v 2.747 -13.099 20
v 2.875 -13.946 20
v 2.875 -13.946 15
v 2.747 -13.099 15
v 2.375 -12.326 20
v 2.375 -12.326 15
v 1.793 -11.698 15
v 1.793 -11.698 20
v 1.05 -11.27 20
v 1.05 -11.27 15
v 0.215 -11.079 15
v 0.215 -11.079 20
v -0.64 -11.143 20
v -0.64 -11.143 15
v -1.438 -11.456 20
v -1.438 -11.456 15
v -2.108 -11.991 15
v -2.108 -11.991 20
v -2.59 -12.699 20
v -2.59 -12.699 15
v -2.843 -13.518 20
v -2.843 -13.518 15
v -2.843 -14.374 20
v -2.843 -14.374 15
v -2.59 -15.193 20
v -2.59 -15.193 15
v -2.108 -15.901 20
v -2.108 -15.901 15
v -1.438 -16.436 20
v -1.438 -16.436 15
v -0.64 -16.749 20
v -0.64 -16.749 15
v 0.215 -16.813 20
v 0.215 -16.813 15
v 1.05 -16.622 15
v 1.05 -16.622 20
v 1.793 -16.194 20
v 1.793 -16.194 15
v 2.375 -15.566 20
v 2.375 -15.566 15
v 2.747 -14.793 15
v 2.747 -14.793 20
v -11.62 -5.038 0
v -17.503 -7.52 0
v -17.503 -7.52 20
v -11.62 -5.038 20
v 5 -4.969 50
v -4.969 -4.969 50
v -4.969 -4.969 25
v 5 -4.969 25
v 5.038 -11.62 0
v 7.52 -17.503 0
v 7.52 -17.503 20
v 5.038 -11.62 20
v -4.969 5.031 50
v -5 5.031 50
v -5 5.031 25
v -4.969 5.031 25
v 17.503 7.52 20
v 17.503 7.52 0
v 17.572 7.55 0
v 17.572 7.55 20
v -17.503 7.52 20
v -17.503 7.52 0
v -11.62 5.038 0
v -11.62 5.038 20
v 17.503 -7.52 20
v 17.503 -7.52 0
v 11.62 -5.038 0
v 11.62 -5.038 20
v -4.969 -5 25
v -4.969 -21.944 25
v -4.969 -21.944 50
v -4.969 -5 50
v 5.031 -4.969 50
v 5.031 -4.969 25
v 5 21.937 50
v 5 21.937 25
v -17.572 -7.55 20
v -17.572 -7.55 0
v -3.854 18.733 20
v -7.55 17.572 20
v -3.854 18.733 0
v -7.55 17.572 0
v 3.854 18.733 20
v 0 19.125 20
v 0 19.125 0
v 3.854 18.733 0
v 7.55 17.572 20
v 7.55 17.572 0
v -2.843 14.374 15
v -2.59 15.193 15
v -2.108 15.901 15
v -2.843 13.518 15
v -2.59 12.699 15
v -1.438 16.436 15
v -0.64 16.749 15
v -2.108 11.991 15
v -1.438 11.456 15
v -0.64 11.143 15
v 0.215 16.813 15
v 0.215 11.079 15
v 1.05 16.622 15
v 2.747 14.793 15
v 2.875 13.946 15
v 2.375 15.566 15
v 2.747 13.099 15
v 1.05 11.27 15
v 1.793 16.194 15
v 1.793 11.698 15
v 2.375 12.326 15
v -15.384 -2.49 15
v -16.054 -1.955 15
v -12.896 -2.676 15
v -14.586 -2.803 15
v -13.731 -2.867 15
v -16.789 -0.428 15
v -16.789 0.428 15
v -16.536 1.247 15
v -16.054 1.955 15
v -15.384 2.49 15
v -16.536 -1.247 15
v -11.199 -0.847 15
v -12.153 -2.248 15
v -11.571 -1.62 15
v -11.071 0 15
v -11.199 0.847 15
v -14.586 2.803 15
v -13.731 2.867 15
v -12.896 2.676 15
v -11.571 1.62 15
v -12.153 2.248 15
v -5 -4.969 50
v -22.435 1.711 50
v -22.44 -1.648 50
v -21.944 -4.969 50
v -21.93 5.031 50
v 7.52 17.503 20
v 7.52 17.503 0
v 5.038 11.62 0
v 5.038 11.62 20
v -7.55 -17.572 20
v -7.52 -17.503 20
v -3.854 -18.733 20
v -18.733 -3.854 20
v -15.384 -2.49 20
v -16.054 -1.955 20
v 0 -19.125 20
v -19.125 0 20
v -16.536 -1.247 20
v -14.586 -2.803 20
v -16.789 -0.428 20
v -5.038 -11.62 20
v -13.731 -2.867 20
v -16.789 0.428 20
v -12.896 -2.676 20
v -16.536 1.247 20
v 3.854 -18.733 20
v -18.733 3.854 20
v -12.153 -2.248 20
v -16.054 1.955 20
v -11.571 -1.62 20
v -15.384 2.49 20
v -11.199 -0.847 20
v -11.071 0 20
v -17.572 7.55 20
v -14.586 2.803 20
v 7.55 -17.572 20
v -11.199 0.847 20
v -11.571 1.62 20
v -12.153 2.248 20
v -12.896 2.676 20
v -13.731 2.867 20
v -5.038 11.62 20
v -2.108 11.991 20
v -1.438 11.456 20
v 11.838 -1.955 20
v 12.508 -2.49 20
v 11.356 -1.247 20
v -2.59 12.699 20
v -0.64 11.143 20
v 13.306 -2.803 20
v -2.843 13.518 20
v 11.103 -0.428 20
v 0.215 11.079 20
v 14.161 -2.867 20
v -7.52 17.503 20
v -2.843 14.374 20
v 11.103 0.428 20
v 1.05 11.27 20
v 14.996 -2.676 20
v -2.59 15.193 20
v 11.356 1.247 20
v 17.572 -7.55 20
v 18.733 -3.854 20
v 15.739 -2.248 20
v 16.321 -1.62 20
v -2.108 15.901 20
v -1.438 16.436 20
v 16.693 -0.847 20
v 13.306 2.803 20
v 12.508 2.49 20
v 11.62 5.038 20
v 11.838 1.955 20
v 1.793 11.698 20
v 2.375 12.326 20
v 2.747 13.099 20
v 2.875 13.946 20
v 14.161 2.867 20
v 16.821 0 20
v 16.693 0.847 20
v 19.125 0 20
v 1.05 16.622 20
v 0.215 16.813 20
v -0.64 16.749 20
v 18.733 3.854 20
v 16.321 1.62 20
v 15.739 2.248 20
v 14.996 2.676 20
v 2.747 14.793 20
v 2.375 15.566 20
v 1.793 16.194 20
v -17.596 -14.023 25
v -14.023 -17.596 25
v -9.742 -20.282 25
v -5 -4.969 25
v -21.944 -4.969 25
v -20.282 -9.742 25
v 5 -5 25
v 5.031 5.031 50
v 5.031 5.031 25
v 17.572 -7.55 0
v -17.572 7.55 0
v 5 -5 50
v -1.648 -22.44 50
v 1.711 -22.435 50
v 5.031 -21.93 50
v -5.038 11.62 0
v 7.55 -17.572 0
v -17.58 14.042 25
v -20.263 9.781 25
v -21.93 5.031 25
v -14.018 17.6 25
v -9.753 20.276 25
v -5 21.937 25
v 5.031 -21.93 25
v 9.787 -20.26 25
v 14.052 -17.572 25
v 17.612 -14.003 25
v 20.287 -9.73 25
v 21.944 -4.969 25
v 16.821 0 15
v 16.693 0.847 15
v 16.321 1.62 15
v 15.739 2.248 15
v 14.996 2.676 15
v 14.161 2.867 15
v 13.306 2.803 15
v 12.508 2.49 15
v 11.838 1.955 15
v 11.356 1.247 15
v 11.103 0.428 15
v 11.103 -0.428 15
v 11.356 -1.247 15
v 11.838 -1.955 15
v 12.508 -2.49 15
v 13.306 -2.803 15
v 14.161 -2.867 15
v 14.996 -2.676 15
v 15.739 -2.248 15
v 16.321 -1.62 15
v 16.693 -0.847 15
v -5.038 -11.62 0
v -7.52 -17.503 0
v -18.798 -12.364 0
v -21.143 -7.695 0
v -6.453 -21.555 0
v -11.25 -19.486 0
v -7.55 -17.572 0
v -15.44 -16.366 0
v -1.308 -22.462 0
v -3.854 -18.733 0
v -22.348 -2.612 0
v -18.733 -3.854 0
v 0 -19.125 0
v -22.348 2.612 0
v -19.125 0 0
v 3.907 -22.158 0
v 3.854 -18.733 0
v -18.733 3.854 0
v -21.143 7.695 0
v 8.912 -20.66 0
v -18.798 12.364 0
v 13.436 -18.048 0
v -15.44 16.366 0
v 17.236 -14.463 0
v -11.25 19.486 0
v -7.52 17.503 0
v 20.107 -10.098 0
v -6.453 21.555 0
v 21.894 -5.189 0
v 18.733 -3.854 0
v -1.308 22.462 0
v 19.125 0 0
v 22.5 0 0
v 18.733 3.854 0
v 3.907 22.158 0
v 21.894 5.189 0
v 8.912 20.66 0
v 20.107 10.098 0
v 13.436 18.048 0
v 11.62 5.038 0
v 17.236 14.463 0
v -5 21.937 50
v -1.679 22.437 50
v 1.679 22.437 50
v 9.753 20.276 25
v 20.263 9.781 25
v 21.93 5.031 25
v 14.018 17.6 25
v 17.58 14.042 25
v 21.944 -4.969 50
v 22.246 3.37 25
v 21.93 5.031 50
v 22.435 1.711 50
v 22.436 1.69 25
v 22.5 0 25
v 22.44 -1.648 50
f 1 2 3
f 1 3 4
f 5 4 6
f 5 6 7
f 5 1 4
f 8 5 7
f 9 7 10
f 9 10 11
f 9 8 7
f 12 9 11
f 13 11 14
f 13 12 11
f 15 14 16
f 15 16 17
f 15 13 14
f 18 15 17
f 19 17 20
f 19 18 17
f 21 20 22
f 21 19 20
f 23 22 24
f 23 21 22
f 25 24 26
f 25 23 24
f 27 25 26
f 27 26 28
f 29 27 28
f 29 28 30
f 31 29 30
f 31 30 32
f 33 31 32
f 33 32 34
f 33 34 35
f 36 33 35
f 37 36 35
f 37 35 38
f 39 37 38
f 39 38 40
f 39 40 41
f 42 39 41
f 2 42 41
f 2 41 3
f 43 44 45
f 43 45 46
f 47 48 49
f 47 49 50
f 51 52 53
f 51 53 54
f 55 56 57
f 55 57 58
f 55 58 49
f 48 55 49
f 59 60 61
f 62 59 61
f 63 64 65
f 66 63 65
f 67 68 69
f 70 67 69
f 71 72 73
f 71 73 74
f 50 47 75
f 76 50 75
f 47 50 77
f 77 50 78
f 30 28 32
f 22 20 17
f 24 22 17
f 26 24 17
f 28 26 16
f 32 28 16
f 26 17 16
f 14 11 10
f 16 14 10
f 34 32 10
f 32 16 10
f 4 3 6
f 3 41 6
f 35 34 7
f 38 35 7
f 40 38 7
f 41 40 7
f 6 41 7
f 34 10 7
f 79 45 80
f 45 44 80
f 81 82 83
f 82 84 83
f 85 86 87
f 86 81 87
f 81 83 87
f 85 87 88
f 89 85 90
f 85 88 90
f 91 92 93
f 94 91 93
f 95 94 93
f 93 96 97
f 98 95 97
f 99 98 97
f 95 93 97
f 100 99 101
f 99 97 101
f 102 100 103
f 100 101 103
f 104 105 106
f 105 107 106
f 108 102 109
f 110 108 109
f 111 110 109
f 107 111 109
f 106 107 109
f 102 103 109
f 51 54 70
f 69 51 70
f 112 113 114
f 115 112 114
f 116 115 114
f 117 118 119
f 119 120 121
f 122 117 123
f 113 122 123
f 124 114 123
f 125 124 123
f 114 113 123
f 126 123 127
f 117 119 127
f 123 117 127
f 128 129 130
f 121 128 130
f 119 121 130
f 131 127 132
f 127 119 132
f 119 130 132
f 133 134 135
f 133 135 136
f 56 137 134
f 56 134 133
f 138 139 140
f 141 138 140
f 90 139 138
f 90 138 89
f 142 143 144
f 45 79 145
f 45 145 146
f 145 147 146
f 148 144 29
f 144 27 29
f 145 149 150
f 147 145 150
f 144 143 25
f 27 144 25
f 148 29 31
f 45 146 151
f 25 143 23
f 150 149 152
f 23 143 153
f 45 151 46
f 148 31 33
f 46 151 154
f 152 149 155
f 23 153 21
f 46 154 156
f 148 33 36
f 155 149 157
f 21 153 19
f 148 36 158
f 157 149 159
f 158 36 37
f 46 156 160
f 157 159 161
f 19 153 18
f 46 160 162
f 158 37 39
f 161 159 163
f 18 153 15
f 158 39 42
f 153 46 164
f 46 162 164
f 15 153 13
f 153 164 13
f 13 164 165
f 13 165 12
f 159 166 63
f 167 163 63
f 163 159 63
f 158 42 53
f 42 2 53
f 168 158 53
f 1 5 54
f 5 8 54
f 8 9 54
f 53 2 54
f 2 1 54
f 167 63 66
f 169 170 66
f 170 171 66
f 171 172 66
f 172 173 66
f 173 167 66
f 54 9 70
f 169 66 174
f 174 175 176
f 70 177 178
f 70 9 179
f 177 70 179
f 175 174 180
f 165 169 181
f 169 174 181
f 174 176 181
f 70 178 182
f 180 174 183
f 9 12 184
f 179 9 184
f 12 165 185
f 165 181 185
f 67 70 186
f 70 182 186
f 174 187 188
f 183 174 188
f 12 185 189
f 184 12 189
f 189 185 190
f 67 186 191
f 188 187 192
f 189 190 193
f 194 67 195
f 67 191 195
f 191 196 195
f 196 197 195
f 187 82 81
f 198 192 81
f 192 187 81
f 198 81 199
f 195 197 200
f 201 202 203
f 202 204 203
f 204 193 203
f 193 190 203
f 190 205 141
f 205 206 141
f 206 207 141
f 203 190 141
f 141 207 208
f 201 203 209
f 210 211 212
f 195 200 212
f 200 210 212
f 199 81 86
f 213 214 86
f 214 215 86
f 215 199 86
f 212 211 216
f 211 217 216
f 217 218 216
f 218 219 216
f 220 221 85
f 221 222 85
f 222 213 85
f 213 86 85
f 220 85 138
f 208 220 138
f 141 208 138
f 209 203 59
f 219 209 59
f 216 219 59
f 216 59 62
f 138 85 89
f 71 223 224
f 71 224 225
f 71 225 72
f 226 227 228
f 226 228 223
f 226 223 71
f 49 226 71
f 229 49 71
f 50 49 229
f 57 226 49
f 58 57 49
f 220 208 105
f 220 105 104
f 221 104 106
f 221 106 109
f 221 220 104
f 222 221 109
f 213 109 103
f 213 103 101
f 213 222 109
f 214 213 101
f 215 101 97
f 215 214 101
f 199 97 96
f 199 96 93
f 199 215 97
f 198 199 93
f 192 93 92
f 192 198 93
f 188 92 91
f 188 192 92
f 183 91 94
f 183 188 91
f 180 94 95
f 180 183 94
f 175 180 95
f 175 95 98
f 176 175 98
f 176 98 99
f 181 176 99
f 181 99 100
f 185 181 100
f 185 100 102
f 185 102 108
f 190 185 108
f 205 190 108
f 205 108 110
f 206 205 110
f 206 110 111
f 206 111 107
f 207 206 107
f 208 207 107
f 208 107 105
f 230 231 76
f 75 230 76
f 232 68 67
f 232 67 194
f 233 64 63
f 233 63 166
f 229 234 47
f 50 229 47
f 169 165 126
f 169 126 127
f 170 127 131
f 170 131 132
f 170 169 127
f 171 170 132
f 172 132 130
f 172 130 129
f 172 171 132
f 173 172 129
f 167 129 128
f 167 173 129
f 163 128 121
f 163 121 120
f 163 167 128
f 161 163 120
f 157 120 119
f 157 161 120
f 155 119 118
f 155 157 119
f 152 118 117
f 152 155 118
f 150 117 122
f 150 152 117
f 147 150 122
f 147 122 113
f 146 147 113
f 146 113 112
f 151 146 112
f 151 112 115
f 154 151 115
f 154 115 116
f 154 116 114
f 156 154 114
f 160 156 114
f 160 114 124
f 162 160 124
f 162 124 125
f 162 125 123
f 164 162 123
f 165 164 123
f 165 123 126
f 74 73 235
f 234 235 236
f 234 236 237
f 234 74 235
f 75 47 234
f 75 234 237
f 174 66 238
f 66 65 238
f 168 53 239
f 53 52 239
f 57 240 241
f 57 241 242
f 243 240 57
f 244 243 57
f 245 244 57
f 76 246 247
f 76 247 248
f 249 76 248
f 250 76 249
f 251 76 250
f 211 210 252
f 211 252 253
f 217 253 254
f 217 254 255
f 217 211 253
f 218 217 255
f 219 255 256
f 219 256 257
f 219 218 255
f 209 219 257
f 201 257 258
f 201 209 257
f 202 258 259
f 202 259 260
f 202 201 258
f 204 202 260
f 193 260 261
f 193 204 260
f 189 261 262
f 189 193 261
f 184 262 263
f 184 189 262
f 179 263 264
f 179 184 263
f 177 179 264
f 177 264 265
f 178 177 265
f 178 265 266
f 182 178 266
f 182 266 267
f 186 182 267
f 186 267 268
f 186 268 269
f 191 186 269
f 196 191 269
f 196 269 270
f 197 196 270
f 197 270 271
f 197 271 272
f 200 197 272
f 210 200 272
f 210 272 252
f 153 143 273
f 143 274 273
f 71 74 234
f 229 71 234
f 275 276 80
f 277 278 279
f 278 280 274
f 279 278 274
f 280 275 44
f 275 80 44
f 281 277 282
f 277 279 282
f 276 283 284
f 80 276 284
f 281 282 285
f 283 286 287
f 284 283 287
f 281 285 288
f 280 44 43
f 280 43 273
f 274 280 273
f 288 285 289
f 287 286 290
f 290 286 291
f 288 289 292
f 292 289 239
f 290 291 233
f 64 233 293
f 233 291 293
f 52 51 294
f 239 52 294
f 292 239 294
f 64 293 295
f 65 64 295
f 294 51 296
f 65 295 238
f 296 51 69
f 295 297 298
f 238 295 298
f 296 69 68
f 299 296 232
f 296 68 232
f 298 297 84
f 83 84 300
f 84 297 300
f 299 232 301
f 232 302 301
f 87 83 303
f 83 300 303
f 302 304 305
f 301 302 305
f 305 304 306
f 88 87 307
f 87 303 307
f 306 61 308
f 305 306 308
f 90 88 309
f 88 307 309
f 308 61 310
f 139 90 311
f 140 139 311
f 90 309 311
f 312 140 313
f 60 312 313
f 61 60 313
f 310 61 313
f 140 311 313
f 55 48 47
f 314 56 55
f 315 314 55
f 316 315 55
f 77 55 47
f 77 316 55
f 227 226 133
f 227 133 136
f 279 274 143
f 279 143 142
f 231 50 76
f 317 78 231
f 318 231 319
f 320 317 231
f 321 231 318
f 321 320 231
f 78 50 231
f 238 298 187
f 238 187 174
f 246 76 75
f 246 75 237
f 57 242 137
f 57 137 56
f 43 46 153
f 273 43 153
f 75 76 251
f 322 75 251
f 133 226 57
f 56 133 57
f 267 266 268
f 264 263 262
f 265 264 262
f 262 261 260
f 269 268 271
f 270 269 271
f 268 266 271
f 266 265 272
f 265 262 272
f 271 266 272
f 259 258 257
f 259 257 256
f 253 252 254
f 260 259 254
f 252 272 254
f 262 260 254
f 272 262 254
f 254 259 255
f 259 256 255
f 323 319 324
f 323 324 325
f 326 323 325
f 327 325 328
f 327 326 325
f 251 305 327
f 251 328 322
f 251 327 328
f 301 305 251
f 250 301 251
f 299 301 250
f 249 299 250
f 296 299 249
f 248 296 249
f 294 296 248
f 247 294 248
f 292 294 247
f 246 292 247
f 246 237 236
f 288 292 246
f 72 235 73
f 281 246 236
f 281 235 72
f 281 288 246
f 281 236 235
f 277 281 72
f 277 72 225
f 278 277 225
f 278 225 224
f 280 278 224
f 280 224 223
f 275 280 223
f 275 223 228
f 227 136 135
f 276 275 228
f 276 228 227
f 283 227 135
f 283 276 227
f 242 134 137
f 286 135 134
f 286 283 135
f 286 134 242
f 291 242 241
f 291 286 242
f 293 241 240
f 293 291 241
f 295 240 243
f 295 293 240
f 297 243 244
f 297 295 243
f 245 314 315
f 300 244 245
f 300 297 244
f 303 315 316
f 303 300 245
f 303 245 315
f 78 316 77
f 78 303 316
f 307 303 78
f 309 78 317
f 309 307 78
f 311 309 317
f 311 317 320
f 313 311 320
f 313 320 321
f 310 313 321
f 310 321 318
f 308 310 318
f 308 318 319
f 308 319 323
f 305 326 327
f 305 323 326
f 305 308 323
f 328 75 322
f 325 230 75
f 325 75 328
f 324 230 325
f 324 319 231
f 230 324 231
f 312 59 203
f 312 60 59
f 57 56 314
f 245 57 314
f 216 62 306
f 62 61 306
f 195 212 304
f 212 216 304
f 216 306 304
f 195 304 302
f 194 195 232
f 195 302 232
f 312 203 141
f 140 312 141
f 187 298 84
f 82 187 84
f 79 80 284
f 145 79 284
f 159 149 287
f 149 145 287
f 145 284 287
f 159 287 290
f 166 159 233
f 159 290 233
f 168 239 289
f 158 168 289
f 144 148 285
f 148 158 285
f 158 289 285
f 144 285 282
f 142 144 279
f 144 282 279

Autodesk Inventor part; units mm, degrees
ref_plane "YZ Plane" through (0, 0, 0) normal (1, 0, 0) x (0, 1, 0)
ref_plane "XZ Plane" through (0, 0, 0) normal (0, 1, 0) x (-1, 0, 0)
ref_plane "XY Plane" through (0, 0, 0) normal (0, 0, 1) x (1, 0, 0)
sketch "Sketch1" plane through (0, 0, 0) normal (0, 0, 1) x (1, 0, 0)
  circle A0 centre (0, 0) radius 22.5
  arc A1 (7.2901, 17.5999) -> (-7.2901, 17.5999) centre (0, 0) ccw
  line L0 (-7.2901, 17.5999) -> (-7.5205, 17.5027)
  line L1 (-4.7835, 11.5485) -> (-4.8792, 11.7795)
  line L2 (-7.5205, 17.5027) -> (-4.7835, 11.0159)
  line L3 (-11.5485, 4.7835) -> (-11.7795, 4.8792)
  line L4 (-11.7795, 4.8792) -> (-4.8792, 11.7795)
  line L5 (0, 0) -> (-3.3576, 3.3576)
  line L6 (0, 0) -> (0, 3.3576)
  line L7 (0, 0) -> (-2.7445, 0)
  line L8 (-17.5027, 7.5205) -> (-11.0159, 4.7835)
  line L9 (0, 0) -> (2.6435, 2.6435)
  line L10 (7.5205, -17.5027) -> (4.7835, -11.0159)
  line L11 (4.8792, -11.7795) -> (11.7795, -4.8792)
  line L12 (17.5027, -7.5205) -> (11.0159, -4.7835)
  line L13 (17.5027, 7.5205) -> (11.0159, 4.7835)
  line L14 (11.7795, 4.8792) -> (4.8792, 11.7795)
  line L15 (7.5205, 17.5027) -> (4.7835, 11.0159)
  line L16 (-17.5027, -7.5205) -> (-11.0159, -4.7835)
  line L17 (-11.7795, -4.8792) -> (-4.8792, -11.7795)
  line L18 (-7.5205, -17.5027) -> (-4.7835, -11.0159)
  arc A2 (-17.5027, 7.5205) -> (-17.5027, -7.5205) centre (0, 0) ccw
  arc A3 (-7.5205, -17.5027) -> (7.5205, -17.5027) centre (0, 0) ccw
  arc A4 (17.5027, -7.5205) -> (17.5027, 7.5205) centre (0, 0) ccw
  arc A5 (7.5205, 17.5027) -> (-7.5205, 17.5027) centre (0, 0) ccw
  line L19 (17.5027, 7.5205) -> (18.4489, 7.9197)
  line L20 (7.5205, 17.5027) -> (7.9197, 18.4489)
  line L21 (-17.5027, 7.5205) -> (-18.4489, 7.9197)
  line L22 (-7.5205, 17.5027) -> (-7.9197, 18.4489)
  line L23 (17.5027, -7.5205) -> (18.4489, -7.9197)
  line L24 (7.5205, -17.5027) -> (7.9197, -18.4489)
  line L25 (-7.5205, -17.5027) -> (-7.9197, -18.4489)
  line L26 (-17.5027, -7.5205) -> (-18.4489, -7.9197)
  arc A6 (7.5496, 17.5718) -> (-7.5496, 17.5718) centre (0, 0) ccw
  arc A7 (17.5718, -7.5496) -> (17.5718, 7.5496) centre (0, 0) ccw
  arc A8 (-17.5718, 7.5496) -> (-17.5718, -7.5496) centre (0, 0) ccw
  arc A9 (-7.5496, -17.5718) -> (7.5496, -17.5718) centre (0, 0) ccw
  point P0 (-5.0385, -11.6202)
  point P1 (-11.6202, -5.0385)
  point P2 (-11.6202, 5.0385)
  point P3 (-5.0385, 11.6202)
  point P4 (5.0385, 11.6202)
  point P5 (11.6202, 5.0385)
  point P6 (11.6202, -5.0385)
  point P7 (5.0385, -11.6202)
  dimension "d0" = 45
  dimension "d1" = 0.25
  dimension "d2" = 0.25
  dimension "d3" = 0.25
extrude "Extrusion1" add sketch "Sketch1" along normal blind 20
sketch "Sketch2" plane through (0, 0, 20) normal (0, 0, 1) x (1, 0, 0)
  circle A0 centre (13.946, 0) radius 2.875
  circle A1 centre (0, -13.946) radius 2.875
  circle A2 centre (-13.946, 0) radius 2.875
  circle A3 centre (0, 13.946) radius 2.875
  point P0 (0, 0)
  point P1 (0, 0)
  dimension "d7" = 5.75
  dimension "d8" = 5.75
  dimension "d9" = 5.75
  dimension "d10" = 5.75
extrude "Extrusion2" add sketch "Sketch2" against normal blind 5
sketch "Sketch3" plane through (0, 0, 20) normal (0, 0, 1) x (1, 0, 0)
  circle A0 centre (0, 0) radius 22.5
extrude "Extrusion3" add sketch "Sketch3" along normal blind 5
sketch "Sketch4" plane through (0, 0, 25) normal (0, 0, 1) x (1, 0, 0)
  line L0 (-5, -5) -> (5, -5)
  line L1 (5, -5) -> (5, 5)
  line L2 (5, 5) -> (-5, 5)
  line L3 (-5, 5) -> (-5, -5)
  line L4 (-5, -5) -> (5, 5) construction
  line L5 (5, -5) -> (-5, 5) construction
  circle A0 centre (0, 0) radius 22.5 projected
  line L6 (5, 5) -> (-3.5794, 5)
  line L7 (5, 5) -> (-5, 5)
  line L8 (-5, 5) -> (-5, 25)
  line L9 (-5, 25) -> (5, 25)
  line L10 (5, 25) -> (5, 5)
  line L11 (-4.9693, -4.9693) -> (-24.9693, -4.9693)
  line L12 (-24.9693, -4.9693) -> (-24.9693, 5.0307)
  line L13 (-24.9693, 5.0307) -> (-4.9693, 5.0307)
  line L14 (-4.9693, 5.0307) -> (-4.9693, -4.9693)
  line L15 (-4.9693, -4.9693) -> (5.0307, -4.9693)
  line L16 (5.0307, -4.9693) -> (5.0307, -24.9693)
  line L17 (5.0307, -24.9693) -> (-4.9693, -24.9693)
  line L18 (-4.9693, -24.9693) -> (-4.9693, -4.9693)
  line L19 (5.0307, -4.9693) -> (25.0307, -4.9693)
  line L20 (25.0307, -4.9693) -> (25.0307, 5.0307)
  line L21 (25.0307, 5.0307) -> (5.0307, 5.0307)
  line L22 (5.0307, 5.0307) -> (5.0307, -4.9693)
  circle A1 centre (0, 0) radius 22.5
  point P0 (-4.9693, -5)
  point P1 (-4.9693, -21.9444)
  point P2 (5.0307, -21.9304)
  point P3 (5, -4.9693)
  point P4 (-5, 5.0307)
  point P5 (-21.9304, 5.0307)
  point P6 (-21.9444, -4.9693)
  point P7 (-5, -4.9693)
  point P8 (5, 21.9374)
  point P9 (-5, 21.9374)
  point P10 (21.9444, -4.9693)
  point P11 (21.9304, 5.0307)
  dimension "d15" = 10
  dimension "d16" = 10
  dimension "d17" = 10
  dimension "d18" = 20
  dimension "d19" = 20
  dimension "d20" = 10
  dimension "d21" = 10
  dimension "d22" = 20
  dimension "d23" = 20
  dimension "d24" = 10
extrude "Extrusion4" add sketch "Sketch4" along normal blind 25 contours L0 L1 L15 L16 A0 L18 | L11 A0 L13 L8 L3 | L14 L2 L1 L15 | L14 L13 L8 A0 L10 L2 | L22 L21 A0 L19
properties part number "3xxx_Tx_Coil_Winding_MPSv2_v1.form"
